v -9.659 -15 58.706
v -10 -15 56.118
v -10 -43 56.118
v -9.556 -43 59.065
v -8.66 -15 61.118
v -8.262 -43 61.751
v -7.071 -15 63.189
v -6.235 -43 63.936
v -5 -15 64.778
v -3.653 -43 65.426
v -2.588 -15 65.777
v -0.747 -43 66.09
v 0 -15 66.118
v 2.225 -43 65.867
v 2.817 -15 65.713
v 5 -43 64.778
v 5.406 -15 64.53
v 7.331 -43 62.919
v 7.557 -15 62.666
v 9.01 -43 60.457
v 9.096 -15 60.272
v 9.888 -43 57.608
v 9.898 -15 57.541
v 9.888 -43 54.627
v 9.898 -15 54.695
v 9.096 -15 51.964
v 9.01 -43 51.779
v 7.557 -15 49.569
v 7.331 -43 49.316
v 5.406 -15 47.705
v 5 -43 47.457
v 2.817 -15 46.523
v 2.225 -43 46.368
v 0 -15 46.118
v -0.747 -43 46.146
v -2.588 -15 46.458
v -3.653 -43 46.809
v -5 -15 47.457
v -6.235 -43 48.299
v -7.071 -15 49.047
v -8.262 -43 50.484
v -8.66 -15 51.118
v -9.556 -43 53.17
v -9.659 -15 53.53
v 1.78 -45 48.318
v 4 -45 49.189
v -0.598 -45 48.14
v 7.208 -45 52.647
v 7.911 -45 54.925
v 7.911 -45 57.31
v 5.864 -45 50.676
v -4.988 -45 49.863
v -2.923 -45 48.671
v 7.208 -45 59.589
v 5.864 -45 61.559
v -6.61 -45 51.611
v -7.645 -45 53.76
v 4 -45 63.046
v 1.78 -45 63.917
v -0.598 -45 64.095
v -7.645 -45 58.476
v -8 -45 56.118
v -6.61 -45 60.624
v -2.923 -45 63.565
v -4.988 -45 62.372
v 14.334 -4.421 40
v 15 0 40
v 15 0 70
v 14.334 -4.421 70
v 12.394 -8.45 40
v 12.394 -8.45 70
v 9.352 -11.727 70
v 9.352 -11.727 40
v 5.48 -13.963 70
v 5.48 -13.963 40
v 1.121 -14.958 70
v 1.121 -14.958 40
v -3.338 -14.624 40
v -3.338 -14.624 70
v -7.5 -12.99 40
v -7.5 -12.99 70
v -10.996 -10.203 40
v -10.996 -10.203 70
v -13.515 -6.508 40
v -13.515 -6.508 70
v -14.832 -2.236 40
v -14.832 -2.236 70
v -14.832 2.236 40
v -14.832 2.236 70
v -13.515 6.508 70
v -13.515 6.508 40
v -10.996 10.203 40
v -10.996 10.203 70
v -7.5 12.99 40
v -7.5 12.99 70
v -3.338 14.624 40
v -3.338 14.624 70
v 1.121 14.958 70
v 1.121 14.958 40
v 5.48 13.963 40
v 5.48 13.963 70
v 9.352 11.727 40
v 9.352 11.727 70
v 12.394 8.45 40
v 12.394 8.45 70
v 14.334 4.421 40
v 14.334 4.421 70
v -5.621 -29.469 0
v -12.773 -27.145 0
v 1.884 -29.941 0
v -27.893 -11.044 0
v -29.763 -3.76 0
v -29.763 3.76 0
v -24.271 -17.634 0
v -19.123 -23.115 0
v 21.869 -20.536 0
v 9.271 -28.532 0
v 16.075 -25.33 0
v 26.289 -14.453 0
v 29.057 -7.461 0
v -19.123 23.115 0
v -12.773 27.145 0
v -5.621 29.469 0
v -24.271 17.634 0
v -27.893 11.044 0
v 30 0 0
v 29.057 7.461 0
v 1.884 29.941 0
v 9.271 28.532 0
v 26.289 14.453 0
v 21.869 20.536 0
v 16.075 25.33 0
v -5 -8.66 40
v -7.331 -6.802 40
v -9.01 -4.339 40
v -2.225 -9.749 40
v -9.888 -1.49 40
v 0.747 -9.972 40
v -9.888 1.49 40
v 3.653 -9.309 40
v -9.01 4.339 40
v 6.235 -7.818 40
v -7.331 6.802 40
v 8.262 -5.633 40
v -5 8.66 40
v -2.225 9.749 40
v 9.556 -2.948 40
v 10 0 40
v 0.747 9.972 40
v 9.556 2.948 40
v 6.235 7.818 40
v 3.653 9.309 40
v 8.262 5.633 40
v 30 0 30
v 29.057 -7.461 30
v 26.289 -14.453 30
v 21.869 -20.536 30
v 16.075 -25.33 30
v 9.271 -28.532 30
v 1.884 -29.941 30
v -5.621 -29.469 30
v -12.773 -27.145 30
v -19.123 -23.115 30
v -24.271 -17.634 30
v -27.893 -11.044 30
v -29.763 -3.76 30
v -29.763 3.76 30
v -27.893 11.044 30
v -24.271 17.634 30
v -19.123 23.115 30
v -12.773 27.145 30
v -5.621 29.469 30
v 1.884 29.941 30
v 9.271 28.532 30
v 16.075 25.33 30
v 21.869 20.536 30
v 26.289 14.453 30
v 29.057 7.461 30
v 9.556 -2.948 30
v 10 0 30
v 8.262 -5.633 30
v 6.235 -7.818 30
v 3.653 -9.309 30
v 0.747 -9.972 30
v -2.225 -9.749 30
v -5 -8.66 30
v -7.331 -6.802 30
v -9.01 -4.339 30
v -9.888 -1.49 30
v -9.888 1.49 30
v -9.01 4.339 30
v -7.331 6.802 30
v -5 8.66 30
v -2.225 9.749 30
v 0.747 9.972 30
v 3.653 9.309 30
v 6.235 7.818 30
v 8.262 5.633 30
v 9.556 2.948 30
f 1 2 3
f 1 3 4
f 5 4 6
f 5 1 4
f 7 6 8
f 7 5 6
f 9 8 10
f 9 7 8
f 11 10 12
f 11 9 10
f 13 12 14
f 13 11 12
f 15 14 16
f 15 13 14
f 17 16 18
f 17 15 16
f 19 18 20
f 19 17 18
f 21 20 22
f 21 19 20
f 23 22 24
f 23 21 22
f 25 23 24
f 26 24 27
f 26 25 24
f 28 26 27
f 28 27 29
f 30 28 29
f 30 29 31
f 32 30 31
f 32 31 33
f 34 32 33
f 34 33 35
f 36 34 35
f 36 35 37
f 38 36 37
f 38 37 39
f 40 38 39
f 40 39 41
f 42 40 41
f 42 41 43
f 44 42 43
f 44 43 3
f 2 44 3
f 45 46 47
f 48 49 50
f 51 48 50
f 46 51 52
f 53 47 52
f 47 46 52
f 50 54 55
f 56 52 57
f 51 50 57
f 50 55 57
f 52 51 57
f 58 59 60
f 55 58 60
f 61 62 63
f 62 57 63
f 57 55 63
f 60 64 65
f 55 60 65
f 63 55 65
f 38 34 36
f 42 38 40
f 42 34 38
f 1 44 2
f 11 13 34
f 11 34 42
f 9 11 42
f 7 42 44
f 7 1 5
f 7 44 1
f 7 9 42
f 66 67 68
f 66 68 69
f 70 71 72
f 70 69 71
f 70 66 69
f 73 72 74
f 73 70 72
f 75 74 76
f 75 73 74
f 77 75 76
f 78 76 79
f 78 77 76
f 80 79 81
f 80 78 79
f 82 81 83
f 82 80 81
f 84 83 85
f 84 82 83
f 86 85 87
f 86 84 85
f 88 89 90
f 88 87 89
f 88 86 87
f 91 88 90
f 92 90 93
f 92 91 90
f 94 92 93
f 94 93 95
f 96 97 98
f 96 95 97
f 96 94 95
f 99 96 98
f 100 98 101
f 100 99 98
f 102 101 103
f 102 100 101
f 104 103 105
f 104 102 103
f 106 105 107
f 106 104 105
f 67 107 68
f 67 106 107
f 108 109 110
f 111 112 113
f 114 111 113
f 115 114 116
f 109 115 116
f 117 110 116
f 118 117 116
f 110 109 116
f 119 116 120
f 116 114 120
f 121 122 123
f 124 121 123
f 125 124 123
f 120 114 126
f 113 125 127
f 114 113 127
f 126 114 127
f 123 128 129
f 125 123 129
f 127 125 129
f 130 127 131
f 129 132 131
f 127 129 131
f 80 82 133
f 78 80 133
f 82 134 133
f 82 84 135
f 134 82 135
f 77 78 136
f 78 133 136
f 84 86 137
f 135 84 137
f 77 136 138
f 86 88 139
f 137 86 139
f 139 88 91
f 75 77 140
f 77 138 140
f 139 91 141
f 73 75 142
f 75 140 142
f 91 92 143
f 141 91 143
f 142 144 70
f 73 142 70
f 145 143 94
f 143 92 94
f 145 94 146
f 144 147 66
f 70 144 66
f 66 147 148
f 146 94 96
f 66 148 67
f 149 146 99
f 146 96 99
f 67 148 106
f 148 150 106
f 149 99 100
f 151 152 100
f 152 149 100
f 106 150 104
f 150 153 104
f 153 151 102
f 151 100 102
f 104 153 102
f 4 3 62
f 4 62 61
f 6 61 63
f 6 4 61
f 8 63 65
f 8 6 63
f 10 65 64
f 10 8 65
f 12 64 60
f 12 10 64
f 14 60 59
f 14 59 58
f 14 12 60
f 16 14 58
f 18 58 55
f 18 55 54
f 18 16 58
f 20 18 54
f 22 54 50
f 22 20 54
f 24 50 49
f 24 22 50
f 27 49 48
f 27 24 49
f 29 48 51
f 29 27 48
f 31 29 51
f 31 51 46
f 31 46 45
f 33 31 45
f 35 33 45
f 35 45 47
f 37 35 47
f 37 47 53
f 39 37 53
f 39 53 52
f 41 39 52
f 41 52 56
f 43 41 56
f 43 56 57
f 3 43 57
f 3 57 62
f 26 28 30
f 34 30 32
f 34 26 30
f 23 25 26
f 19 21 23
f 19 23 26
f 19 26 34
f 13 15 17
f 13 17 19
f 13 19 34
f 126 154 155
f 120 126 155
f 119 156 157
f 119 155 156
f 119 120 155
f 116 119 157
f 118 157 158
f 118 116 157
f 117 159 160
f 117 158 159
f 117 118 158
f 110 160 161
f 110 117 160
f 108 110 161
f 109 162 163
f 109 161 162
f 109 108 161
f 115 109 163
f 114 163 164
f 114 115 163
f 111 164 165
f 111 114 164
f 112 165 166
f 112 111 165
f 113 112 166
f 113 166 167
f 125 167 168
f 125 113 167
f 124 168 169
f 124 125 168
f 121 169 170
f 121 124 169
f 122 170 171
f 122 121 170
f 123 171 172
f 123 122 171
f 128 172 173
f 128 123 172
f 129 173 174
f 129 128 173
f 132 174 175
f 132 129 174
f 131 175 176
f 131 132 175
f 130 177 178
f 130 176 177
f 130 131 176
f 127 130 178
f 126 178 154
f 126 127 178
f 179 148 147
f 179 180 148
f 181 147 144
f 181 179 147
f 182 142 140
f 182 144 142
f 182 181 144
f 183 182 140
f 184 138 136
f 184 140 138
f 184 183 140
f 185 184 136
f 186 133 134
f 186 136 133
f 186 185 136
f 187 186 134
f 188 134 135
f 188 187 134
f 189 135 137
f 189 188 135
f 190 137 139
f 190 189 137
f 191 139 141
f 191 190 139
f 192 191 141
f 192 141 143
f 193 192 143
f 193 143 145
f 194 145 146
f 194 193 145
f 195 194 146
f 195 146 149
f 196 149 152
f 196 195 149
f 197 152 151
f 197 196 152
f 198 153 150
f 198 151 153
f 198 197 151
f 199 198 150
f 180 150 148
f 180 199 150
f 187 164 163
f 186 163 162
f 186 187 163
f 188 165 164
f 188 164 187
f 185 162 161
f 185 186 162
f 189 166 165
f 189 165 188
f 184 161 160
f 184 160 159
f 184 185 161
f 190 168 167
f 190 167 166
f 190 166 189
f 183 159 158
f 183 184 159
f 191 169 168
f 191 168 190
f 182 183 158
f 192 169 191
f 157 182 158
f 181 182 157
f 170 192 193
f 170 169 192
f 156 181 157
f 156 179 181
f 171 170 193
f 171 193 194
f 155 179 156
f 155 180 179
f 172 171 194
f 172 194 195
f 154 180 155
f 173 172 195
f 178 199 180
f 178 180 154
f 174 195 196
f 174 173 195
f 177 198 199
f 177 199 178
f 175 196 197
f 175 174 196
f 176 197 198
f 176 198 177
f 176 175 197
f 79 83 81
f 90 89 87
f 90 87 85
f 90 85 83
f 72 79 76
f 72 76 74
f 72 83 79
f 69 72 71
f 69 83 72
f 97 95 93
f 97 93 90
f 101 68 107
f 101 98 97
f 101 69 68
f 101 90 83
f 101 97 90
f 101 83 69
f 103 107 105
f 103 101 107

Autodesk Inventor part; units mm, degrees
ref_plane "YZ Plane" through (0, 0, 0) normal (1, 0, 0) x (0, 1, 0)
ref_plane "XZ Plane" through (0, 0, 0) normal (0, 1, 0) x (-1, 0, 0)
ref_plane "XY Plane" through (0, 0, 0) normal (0, 0, 1) x (1, 0, 0)
sketch "Sketch1" plane through (0, 0, 0) normal (0, 0, 1) x (1, 0, 0)
  circle A0 centre (0, 0) radius 30
  dimension "d0" = 60
extrude "Extrusion1" add sketch "Sketch1" along normal blind 30
sketch "Sketch2" plane through (0, 0, 30) normal (0, 0, 1) x (1, 0, 0)
  circle A0 centre (0, 0) radius 10
  dimension "d3" = 20
extrude "Extrusion2" add sketch "Sketch2" along normal blind 10
sketch "Sketch3" plane through (0, 0, 40) normal (0, 0, 1) x (1, 0, 0)
  circle A0 centre (0, 0) radius 15
  dimension "d6" = 30
extrude "Extrusion3" add sketch "Sketch3" along normal blind 30
ref_plane "Work Plane3" through (0, -15, 40) normal (0, 1, 0) x (-1, 0, 0)
sketch "Sketch4" plane through (0, -15, 40) normal (0, 1, 0) x (-1, 0, 0)
  circle A0 centre (0, 16.1177) radius 10
  point P0 (0, -40)
  dimension "d9" = 20
extrude "Extrusion4" add sketch "Sketch4" against normal blind 30
chamfer "Chamfer1" distance 2 angle 45 1 edges at (10, -45, 56.1177)
properties part number "new robo wheel"
